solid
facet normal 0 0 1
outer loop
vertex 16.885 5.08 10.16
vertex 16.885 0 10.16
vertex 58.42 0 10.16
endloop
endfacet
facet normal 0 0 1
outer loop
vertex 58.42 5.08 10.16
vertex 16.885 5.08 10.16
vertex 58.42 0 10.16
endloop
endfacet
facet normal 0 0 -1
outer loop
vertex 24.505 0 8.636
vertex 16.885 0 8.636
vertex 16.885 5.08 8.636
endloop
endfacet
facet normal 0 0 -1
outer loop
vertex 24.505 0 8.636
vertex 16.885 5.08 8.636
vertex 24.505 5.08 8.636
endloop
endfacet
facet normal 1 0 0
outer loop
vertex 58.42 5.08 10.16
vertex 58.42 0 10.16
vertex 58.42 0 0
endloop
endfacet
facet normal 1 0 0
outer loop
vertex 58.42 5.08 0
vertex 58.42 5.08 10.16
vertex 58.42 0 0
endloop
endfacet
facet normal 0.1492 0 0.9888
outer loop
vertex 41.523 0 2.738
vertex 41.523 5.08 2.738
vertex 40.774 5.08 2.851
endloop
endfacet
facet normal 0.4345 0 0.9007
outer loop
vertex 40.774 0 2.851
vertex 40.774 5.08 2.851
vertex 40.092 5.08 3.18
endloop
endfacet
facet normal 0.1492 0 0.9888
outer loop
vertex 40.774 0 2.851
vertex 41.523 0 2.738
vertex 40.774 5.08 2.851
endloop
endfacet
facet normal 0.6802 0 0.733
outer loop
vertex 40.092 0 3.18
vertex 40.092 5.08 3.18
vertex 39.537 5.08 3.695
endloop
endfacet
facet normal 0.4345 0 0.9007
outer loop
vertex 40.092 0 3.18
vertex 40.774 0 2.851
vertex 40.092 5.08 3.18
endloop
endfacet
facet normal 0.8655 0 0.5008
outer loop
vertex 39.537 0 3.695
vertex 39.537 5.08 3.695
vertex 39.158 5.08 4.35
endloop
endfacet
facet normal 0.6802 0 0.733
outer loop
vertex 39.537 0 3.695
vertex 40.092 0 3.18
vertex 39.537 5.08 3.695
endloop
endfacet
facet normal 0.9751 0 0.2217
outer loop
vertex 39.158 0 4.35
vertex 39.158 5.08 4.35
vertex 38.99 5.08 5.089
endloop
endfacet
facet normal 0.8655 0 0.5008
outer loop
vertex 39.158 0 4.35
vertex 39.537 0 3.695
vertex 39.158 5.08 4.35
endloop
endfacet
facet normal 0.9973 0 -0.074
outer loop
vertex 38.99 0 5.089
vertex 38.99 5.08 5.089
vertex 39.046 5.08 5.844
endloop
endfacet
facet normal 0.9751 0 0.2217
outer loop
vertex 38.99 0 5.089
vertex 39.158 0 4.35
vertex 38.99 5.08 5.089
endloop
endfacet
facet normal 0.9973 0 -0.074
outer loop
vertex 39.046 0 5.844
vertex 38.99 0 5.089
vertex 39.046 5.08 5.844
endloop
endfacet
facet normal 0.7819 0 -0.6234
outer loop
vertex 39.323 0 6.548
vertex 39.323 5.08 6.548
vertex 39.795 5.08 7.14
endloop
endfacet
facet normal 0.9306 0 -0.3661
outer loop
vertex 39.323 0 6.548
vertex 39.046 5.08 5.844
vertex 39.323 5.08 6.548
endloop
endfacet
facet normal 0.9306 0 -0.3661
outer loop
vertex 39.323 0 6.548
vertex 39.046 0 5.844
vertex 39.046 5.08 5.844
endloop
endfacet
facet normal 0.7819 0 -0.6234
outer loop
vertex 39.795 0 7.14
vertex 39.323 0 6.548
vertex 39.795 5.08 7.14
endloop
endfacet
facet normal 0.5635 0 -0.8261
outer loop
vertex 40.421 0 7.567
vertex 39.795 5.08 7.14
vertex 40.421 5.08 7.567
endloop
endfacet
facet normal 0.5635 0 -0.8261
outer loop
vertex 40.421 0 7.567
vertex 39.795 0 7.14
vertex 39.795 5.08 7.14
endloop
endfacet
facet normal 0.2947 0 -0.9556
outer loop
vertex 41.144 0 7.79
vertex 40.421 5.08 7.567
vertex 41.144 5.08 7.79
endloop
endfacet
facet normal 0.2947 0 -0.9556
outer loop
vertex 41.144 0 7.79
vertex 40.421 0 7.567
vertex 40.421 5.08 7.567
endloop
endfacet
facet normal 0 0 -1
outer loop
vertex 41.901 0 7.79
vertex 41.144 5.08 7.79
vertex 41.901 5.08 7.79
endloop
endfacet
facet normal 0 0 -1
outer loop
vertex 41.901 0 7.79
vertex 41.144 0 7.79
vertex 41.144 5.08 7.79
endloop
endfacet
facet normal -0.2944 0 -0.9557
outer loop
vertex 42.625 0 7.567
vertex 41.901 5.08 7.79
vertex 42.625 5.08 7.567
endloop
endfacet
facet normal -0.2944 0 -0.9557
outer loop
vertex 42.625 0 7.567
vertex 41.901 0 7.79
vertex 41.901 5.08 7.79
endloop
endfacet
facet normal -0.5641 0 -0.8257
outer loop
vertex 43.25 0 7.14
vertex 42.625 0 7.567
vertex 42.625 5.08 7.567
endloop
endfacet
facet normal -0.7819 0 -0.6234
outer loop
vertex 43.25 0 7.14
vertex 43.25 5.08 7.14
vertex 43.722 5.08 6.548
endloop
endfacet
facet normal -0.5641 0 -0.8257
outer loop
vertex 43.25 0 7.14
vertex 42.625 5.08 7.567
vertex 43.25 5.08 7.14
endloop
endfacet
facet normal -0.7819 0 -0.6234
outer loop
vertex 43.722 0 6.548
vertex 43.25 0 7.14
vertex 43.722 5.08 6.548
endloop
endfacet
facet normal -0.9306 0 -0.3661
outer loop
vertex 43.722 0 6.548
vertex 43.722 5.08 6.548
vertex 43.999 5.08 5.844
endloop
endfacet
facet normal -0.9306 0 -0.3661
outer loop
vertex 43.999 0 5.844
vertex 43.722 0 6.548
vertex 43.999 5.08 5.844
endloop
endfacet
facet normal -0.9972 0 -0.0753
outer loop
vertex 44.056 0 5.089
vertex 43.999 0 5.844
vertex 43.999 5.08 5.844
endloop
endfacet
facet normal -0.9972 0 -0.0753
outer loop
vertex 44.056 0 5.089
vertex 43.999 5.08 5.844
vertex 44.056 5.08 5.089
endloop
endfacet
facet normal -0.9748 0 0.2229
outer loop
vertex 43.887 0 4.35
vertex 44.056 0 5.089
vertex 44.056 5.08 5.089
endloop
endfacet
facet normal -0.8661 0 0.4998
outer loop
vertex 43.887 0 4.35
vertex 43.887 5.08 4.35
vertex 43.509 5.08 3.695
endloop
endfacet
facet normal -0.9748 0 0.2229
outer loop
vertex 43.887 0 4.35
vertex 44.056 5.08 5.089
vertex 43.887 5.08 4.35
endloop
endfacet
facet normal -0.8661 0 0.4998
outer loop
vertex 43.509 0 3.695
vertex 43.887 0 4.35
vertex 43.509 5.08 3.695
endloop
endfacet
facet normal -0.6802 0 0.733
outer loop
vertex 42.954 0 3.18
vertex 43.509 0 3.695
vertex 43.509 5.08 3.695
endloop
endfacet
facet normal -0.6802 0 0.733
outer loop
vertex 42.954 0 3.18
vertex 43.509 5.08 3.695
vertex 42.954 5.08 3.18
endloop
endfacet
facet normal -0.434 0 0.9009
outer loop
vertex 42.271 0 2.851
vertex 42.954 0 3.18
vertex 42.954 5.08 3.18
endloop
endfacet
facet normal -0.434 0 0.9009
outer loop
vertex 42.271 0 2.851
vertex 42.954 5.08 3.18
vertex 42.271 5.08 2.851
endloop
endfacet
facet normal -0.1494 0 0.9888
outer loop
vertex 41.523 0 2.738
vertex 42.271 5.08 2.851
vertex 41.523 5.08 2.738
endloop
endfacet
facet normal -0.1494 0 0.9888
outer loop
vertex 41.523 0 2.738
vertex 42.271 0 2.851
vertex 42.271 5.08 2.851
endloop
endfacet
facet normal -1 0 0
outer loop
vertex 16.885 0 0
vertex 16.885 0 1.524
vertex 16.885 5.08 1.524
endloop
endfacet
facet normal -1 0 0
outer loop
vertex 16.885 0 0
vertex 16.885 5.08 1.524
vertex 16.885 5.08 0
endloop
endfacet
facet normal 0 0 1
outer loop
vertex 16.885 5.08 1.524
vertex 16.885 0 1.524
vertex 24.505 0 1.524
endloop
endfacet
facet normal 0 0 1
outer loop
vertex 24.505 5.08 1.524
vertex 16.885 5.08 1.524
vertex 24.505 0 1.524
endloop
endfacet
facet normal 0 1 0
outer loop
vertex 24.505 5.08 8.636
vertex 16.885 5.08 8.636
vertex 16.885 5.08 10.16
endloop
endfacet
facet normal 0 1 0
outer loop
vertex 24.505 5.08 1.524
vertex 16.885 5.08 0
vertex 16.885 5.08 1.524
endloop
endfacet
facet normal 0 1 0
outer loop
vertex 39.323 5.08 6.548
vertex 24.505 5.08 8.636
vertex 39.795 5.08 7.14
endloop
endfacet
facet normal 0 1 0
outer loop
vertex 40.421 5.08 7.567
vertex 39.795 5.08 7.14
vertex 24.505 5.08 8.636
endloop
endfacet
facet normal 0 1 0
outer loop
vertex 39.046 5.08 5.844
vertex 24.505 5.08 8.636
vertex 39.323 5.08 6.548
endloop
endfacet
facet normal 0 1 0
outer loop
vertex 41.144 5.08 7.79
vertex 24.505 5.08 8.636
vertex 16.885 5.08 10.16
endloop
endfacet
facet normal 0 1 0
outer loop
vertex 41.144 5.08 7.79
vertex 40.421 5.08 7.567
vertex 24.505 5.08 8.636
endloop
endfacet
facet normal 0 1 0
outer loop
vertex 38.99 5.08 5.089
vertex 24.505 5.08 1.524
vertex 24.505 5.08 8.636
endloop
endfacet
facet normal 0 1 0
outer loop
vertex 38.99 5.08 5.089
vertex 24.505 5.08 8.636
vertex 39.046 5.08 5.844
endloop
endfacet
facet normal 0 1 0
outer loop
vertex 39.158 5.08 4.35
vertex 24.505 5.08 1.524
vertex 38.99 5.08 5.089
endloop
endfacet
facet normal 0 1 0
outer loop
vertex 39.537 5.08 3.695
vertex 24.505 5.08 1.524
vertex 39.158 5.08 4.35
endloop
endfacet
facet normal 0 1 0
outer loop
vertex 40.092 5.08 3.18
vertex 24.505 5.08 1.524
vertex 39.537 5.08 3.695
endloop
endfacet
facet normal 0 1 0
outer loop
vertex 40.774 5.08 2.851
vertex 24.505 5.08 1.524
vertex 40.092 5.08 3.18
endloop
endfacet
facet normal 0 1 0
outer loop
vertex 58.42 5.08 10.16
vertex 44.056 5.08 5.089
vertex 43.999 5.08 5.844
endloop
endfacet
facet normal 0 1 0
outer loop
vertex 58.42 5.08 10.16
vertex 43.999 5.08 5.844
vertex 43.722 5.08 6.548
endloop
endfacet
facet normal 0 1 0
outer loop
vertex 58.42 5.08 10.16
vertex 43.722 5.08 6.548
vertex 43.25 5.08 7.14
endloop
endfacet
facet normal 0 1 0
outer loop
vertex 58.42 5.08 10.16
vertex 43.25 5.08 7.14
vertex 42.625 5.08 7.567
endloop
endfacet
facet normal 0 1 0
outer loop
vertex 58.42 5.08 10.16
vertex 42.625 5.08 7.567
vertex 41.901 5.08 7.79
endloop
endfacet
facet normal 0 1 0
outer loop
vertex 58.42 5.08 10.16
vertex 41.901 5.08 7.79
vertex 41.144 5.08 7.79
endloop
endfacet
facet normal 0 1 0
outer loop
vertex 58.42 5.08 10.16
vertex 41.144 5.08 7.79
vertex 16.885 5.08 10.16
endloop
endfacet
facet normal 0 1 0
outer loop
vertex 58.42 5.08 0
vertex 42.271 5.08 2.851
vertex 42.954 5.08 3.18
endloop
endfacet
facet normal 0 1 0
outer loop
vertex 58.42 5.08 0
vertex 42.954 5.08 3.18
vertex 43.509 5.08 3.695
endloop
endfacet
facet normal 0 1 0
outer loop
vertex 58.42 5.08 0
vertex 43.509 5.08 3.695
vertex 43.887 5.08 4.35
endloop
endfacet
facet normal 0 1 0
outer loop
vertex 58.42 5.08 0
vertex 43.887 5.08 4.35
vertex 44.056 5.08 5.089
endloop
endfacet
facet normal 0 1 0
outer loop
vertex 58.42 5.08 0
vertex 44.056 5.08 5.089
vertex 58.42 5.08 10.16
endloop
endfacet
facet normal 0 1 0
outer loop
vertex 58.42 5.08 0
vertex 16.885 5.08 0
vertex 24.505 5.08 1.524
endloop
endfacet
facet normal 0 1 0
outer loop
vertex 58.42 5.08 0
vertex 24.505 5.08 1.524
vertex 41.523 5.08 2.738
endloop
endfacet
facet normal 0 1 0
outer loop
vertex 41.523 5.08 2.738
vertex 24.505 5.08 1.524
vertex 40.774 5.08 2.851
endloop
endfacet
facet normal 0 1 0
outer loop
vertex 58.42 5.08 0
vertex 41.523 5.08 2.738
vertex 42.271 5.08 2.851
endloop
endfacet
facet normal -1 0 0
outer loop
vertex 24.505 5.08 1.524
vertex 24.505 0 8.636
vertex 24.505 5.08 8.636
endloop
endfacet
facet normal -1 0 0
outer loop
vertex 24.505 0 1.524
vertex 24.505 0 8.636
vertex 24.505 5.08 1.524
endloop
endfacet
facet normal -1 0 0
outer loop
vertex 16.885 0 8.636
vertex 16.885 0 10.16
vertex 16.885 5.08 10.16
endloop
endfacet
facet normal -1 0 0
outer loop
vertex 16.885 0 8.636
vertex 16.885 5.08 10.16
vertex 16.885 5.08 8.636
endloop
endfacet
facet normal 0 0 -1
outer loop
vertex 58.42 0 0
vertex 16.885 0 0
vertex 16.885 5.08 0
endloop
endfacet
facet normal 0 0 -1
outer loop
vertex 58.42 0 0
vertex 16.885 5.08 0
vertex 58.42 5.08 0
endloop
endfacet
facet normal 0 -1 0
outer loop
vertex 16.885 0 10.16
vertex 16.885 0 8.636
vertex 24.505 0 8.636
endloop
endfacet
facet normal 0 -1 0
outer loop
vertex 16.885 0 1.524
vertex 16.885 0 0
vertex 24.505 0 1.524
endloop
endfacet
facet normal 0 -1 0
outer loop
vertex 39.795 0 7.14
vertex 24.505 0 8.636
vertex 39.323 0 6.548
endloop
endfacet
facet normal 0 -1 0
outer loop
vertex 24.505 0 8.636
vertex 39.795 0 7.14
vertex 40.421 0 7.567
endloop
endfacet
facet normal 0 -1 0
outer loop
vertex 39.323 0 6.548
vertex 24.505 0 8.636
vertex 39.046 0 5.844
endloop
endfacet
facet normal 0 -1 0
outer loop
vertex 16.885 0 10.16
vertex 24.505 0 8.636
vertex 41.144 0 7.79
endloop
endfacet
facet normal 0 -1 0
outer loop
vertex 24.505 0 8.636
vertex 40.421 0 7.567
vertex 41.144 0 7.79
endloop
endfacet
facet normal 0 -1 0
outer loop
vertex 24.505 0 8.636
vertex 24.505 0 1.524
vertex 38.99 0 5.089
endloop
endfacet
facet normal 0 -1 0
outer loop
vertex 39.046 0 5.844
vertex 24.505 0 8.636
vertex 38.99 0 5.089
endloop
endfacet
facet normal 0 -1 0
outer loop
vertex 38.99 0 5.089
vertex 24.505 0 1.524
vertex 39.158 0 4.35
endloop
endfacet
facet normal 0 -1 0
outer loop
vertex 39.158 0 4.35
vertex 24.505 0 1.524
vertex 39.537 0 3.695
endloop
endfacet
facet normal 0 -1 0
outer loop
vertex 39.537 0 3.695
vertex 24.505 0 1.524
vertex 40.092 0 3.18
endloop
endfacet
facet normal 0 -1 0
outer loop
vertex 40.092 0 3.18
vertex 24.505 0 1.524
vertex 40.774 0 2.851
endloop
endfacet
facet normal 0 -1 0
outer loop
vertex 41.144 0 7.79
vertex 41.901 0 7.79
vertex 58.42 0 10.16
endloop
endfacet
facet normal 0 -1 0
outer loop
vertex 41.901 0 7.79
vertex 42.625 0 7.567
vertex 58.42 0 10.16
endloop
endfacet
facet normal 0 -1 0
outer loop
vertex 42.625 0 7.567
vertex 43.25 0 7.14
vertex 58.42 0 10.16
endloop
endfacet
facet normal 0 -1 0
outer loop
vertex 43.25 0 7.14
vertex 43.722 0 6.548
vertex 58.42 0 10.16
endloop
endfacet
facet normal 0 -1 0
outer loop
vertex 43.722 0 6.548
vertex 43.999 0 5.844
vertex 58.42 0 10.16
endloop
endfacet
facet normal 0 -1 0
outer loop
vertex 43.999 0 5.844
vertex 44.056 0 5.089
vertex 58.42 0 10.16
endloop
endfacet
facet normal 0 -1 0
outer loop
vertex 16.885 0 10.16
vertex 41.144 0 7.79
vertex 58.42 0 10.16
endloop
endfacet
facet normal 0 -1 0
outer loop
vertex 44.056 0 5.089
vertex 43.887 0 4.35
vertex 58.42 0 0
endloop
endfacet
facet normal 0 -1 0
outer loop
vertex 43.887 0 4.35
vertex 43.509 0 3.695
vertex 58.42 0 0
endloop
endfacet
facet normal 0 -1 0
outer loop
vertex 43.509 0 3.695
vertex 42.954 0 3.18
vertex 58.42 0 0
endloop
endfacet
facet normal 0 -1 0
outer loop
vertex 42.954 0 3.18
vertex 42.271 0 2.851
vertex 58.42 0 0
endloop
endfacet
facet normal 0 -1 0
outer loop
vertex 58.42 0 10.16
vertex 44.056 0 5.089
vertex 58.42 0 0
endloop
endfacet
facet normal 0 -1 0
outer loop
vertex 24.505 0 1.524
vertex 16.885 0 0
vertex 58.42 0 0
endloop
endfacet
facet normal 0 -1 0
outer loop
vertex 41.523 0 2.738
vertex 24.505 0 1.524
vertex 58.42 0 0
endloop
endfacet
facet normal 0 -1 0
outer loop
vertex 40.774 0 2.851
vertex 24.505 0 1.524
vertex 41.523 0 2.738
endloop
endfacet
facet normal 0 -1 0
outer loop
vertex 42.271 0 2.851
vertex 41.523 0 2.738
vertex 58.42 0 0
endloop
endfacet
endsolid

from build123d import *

# Parameters (mm, degrees)
SKETCH1_W           = 58.42
SKETCH1_H           = 10.16
BOSS_EXTRUDE2_DEPTH = 5.08
SKETCH2_W           = 24.504723829
SKETCH2_H           = 7.112
CUT_EXTRUDE1_DEPTH  = 11.938
SKETCH3_W           = 16.975122841
SKETCH3_H           = 18.193068874
CUT_EXTRUDE2_DEPTH  = 11.938
SKETCH4_R           = 2.54
CUT_EXTRUDE3_DEPTH  = 8.382


with BuildPart() as part:
    # Sketch1 → Boss-Extrude2 (new body)
    with BuildSketch(Plane(origin=(0, 0, 0), x_dir=(1, 0, 0), z_dir=(0, 1, 0))):
        with Locations((29.21, -5.08)):
            Rectangle(SKETCH1_W, SKETCH1_H)
    extrude(amount=BOSS_EXTRUDE2_DEPTH)

    # Sketch2 → Cut-Extrude1 (cut)
    with BuildSketch(Plane(origin=(0, 0, 0), x_dir=(1, 0, 0), z_dir=(0, 1, 0))):
        with Locations((12.252361915, -5.08)):
            Rectangle(SKETCH2_W, SKETCH2_H)
    extrude(amount=CUT_EXTRUDE1_DEPTH, mode=Mode.SUBTRACT)

    # Sketch3 → Cut-Extrude2 (cut)
    with BuildSketch(Plane(origin=(0, 0, 0), x_dir=(1, 0, 0), z_dir=(0, 1, 0))):
        with Locations((8.397162409, -3.25308095)):
            Rectangle(SKETCH3_W, SKETCH3_H)
    extrude(amount=CUT_EXTRUDE2_DEPTH, mode=Mode.SUBTRACT)

    # Sketch4 → Cut-Extrude3 (cut)
    with BuildSketch(Plane(origin=(0, 0, 0), x_dir=(1, 0, 0), z_dir=(0, 1, 0))):
        with Locations(Location((41.522723829, -5.27842891, 0), (0, 0, 90))):
            Circle(SKETCH4_R)
    extrude(amount=CUT_EXTRUDE3_DEPTH, mode=Mode.SUBTRACT)


solid = part.part
